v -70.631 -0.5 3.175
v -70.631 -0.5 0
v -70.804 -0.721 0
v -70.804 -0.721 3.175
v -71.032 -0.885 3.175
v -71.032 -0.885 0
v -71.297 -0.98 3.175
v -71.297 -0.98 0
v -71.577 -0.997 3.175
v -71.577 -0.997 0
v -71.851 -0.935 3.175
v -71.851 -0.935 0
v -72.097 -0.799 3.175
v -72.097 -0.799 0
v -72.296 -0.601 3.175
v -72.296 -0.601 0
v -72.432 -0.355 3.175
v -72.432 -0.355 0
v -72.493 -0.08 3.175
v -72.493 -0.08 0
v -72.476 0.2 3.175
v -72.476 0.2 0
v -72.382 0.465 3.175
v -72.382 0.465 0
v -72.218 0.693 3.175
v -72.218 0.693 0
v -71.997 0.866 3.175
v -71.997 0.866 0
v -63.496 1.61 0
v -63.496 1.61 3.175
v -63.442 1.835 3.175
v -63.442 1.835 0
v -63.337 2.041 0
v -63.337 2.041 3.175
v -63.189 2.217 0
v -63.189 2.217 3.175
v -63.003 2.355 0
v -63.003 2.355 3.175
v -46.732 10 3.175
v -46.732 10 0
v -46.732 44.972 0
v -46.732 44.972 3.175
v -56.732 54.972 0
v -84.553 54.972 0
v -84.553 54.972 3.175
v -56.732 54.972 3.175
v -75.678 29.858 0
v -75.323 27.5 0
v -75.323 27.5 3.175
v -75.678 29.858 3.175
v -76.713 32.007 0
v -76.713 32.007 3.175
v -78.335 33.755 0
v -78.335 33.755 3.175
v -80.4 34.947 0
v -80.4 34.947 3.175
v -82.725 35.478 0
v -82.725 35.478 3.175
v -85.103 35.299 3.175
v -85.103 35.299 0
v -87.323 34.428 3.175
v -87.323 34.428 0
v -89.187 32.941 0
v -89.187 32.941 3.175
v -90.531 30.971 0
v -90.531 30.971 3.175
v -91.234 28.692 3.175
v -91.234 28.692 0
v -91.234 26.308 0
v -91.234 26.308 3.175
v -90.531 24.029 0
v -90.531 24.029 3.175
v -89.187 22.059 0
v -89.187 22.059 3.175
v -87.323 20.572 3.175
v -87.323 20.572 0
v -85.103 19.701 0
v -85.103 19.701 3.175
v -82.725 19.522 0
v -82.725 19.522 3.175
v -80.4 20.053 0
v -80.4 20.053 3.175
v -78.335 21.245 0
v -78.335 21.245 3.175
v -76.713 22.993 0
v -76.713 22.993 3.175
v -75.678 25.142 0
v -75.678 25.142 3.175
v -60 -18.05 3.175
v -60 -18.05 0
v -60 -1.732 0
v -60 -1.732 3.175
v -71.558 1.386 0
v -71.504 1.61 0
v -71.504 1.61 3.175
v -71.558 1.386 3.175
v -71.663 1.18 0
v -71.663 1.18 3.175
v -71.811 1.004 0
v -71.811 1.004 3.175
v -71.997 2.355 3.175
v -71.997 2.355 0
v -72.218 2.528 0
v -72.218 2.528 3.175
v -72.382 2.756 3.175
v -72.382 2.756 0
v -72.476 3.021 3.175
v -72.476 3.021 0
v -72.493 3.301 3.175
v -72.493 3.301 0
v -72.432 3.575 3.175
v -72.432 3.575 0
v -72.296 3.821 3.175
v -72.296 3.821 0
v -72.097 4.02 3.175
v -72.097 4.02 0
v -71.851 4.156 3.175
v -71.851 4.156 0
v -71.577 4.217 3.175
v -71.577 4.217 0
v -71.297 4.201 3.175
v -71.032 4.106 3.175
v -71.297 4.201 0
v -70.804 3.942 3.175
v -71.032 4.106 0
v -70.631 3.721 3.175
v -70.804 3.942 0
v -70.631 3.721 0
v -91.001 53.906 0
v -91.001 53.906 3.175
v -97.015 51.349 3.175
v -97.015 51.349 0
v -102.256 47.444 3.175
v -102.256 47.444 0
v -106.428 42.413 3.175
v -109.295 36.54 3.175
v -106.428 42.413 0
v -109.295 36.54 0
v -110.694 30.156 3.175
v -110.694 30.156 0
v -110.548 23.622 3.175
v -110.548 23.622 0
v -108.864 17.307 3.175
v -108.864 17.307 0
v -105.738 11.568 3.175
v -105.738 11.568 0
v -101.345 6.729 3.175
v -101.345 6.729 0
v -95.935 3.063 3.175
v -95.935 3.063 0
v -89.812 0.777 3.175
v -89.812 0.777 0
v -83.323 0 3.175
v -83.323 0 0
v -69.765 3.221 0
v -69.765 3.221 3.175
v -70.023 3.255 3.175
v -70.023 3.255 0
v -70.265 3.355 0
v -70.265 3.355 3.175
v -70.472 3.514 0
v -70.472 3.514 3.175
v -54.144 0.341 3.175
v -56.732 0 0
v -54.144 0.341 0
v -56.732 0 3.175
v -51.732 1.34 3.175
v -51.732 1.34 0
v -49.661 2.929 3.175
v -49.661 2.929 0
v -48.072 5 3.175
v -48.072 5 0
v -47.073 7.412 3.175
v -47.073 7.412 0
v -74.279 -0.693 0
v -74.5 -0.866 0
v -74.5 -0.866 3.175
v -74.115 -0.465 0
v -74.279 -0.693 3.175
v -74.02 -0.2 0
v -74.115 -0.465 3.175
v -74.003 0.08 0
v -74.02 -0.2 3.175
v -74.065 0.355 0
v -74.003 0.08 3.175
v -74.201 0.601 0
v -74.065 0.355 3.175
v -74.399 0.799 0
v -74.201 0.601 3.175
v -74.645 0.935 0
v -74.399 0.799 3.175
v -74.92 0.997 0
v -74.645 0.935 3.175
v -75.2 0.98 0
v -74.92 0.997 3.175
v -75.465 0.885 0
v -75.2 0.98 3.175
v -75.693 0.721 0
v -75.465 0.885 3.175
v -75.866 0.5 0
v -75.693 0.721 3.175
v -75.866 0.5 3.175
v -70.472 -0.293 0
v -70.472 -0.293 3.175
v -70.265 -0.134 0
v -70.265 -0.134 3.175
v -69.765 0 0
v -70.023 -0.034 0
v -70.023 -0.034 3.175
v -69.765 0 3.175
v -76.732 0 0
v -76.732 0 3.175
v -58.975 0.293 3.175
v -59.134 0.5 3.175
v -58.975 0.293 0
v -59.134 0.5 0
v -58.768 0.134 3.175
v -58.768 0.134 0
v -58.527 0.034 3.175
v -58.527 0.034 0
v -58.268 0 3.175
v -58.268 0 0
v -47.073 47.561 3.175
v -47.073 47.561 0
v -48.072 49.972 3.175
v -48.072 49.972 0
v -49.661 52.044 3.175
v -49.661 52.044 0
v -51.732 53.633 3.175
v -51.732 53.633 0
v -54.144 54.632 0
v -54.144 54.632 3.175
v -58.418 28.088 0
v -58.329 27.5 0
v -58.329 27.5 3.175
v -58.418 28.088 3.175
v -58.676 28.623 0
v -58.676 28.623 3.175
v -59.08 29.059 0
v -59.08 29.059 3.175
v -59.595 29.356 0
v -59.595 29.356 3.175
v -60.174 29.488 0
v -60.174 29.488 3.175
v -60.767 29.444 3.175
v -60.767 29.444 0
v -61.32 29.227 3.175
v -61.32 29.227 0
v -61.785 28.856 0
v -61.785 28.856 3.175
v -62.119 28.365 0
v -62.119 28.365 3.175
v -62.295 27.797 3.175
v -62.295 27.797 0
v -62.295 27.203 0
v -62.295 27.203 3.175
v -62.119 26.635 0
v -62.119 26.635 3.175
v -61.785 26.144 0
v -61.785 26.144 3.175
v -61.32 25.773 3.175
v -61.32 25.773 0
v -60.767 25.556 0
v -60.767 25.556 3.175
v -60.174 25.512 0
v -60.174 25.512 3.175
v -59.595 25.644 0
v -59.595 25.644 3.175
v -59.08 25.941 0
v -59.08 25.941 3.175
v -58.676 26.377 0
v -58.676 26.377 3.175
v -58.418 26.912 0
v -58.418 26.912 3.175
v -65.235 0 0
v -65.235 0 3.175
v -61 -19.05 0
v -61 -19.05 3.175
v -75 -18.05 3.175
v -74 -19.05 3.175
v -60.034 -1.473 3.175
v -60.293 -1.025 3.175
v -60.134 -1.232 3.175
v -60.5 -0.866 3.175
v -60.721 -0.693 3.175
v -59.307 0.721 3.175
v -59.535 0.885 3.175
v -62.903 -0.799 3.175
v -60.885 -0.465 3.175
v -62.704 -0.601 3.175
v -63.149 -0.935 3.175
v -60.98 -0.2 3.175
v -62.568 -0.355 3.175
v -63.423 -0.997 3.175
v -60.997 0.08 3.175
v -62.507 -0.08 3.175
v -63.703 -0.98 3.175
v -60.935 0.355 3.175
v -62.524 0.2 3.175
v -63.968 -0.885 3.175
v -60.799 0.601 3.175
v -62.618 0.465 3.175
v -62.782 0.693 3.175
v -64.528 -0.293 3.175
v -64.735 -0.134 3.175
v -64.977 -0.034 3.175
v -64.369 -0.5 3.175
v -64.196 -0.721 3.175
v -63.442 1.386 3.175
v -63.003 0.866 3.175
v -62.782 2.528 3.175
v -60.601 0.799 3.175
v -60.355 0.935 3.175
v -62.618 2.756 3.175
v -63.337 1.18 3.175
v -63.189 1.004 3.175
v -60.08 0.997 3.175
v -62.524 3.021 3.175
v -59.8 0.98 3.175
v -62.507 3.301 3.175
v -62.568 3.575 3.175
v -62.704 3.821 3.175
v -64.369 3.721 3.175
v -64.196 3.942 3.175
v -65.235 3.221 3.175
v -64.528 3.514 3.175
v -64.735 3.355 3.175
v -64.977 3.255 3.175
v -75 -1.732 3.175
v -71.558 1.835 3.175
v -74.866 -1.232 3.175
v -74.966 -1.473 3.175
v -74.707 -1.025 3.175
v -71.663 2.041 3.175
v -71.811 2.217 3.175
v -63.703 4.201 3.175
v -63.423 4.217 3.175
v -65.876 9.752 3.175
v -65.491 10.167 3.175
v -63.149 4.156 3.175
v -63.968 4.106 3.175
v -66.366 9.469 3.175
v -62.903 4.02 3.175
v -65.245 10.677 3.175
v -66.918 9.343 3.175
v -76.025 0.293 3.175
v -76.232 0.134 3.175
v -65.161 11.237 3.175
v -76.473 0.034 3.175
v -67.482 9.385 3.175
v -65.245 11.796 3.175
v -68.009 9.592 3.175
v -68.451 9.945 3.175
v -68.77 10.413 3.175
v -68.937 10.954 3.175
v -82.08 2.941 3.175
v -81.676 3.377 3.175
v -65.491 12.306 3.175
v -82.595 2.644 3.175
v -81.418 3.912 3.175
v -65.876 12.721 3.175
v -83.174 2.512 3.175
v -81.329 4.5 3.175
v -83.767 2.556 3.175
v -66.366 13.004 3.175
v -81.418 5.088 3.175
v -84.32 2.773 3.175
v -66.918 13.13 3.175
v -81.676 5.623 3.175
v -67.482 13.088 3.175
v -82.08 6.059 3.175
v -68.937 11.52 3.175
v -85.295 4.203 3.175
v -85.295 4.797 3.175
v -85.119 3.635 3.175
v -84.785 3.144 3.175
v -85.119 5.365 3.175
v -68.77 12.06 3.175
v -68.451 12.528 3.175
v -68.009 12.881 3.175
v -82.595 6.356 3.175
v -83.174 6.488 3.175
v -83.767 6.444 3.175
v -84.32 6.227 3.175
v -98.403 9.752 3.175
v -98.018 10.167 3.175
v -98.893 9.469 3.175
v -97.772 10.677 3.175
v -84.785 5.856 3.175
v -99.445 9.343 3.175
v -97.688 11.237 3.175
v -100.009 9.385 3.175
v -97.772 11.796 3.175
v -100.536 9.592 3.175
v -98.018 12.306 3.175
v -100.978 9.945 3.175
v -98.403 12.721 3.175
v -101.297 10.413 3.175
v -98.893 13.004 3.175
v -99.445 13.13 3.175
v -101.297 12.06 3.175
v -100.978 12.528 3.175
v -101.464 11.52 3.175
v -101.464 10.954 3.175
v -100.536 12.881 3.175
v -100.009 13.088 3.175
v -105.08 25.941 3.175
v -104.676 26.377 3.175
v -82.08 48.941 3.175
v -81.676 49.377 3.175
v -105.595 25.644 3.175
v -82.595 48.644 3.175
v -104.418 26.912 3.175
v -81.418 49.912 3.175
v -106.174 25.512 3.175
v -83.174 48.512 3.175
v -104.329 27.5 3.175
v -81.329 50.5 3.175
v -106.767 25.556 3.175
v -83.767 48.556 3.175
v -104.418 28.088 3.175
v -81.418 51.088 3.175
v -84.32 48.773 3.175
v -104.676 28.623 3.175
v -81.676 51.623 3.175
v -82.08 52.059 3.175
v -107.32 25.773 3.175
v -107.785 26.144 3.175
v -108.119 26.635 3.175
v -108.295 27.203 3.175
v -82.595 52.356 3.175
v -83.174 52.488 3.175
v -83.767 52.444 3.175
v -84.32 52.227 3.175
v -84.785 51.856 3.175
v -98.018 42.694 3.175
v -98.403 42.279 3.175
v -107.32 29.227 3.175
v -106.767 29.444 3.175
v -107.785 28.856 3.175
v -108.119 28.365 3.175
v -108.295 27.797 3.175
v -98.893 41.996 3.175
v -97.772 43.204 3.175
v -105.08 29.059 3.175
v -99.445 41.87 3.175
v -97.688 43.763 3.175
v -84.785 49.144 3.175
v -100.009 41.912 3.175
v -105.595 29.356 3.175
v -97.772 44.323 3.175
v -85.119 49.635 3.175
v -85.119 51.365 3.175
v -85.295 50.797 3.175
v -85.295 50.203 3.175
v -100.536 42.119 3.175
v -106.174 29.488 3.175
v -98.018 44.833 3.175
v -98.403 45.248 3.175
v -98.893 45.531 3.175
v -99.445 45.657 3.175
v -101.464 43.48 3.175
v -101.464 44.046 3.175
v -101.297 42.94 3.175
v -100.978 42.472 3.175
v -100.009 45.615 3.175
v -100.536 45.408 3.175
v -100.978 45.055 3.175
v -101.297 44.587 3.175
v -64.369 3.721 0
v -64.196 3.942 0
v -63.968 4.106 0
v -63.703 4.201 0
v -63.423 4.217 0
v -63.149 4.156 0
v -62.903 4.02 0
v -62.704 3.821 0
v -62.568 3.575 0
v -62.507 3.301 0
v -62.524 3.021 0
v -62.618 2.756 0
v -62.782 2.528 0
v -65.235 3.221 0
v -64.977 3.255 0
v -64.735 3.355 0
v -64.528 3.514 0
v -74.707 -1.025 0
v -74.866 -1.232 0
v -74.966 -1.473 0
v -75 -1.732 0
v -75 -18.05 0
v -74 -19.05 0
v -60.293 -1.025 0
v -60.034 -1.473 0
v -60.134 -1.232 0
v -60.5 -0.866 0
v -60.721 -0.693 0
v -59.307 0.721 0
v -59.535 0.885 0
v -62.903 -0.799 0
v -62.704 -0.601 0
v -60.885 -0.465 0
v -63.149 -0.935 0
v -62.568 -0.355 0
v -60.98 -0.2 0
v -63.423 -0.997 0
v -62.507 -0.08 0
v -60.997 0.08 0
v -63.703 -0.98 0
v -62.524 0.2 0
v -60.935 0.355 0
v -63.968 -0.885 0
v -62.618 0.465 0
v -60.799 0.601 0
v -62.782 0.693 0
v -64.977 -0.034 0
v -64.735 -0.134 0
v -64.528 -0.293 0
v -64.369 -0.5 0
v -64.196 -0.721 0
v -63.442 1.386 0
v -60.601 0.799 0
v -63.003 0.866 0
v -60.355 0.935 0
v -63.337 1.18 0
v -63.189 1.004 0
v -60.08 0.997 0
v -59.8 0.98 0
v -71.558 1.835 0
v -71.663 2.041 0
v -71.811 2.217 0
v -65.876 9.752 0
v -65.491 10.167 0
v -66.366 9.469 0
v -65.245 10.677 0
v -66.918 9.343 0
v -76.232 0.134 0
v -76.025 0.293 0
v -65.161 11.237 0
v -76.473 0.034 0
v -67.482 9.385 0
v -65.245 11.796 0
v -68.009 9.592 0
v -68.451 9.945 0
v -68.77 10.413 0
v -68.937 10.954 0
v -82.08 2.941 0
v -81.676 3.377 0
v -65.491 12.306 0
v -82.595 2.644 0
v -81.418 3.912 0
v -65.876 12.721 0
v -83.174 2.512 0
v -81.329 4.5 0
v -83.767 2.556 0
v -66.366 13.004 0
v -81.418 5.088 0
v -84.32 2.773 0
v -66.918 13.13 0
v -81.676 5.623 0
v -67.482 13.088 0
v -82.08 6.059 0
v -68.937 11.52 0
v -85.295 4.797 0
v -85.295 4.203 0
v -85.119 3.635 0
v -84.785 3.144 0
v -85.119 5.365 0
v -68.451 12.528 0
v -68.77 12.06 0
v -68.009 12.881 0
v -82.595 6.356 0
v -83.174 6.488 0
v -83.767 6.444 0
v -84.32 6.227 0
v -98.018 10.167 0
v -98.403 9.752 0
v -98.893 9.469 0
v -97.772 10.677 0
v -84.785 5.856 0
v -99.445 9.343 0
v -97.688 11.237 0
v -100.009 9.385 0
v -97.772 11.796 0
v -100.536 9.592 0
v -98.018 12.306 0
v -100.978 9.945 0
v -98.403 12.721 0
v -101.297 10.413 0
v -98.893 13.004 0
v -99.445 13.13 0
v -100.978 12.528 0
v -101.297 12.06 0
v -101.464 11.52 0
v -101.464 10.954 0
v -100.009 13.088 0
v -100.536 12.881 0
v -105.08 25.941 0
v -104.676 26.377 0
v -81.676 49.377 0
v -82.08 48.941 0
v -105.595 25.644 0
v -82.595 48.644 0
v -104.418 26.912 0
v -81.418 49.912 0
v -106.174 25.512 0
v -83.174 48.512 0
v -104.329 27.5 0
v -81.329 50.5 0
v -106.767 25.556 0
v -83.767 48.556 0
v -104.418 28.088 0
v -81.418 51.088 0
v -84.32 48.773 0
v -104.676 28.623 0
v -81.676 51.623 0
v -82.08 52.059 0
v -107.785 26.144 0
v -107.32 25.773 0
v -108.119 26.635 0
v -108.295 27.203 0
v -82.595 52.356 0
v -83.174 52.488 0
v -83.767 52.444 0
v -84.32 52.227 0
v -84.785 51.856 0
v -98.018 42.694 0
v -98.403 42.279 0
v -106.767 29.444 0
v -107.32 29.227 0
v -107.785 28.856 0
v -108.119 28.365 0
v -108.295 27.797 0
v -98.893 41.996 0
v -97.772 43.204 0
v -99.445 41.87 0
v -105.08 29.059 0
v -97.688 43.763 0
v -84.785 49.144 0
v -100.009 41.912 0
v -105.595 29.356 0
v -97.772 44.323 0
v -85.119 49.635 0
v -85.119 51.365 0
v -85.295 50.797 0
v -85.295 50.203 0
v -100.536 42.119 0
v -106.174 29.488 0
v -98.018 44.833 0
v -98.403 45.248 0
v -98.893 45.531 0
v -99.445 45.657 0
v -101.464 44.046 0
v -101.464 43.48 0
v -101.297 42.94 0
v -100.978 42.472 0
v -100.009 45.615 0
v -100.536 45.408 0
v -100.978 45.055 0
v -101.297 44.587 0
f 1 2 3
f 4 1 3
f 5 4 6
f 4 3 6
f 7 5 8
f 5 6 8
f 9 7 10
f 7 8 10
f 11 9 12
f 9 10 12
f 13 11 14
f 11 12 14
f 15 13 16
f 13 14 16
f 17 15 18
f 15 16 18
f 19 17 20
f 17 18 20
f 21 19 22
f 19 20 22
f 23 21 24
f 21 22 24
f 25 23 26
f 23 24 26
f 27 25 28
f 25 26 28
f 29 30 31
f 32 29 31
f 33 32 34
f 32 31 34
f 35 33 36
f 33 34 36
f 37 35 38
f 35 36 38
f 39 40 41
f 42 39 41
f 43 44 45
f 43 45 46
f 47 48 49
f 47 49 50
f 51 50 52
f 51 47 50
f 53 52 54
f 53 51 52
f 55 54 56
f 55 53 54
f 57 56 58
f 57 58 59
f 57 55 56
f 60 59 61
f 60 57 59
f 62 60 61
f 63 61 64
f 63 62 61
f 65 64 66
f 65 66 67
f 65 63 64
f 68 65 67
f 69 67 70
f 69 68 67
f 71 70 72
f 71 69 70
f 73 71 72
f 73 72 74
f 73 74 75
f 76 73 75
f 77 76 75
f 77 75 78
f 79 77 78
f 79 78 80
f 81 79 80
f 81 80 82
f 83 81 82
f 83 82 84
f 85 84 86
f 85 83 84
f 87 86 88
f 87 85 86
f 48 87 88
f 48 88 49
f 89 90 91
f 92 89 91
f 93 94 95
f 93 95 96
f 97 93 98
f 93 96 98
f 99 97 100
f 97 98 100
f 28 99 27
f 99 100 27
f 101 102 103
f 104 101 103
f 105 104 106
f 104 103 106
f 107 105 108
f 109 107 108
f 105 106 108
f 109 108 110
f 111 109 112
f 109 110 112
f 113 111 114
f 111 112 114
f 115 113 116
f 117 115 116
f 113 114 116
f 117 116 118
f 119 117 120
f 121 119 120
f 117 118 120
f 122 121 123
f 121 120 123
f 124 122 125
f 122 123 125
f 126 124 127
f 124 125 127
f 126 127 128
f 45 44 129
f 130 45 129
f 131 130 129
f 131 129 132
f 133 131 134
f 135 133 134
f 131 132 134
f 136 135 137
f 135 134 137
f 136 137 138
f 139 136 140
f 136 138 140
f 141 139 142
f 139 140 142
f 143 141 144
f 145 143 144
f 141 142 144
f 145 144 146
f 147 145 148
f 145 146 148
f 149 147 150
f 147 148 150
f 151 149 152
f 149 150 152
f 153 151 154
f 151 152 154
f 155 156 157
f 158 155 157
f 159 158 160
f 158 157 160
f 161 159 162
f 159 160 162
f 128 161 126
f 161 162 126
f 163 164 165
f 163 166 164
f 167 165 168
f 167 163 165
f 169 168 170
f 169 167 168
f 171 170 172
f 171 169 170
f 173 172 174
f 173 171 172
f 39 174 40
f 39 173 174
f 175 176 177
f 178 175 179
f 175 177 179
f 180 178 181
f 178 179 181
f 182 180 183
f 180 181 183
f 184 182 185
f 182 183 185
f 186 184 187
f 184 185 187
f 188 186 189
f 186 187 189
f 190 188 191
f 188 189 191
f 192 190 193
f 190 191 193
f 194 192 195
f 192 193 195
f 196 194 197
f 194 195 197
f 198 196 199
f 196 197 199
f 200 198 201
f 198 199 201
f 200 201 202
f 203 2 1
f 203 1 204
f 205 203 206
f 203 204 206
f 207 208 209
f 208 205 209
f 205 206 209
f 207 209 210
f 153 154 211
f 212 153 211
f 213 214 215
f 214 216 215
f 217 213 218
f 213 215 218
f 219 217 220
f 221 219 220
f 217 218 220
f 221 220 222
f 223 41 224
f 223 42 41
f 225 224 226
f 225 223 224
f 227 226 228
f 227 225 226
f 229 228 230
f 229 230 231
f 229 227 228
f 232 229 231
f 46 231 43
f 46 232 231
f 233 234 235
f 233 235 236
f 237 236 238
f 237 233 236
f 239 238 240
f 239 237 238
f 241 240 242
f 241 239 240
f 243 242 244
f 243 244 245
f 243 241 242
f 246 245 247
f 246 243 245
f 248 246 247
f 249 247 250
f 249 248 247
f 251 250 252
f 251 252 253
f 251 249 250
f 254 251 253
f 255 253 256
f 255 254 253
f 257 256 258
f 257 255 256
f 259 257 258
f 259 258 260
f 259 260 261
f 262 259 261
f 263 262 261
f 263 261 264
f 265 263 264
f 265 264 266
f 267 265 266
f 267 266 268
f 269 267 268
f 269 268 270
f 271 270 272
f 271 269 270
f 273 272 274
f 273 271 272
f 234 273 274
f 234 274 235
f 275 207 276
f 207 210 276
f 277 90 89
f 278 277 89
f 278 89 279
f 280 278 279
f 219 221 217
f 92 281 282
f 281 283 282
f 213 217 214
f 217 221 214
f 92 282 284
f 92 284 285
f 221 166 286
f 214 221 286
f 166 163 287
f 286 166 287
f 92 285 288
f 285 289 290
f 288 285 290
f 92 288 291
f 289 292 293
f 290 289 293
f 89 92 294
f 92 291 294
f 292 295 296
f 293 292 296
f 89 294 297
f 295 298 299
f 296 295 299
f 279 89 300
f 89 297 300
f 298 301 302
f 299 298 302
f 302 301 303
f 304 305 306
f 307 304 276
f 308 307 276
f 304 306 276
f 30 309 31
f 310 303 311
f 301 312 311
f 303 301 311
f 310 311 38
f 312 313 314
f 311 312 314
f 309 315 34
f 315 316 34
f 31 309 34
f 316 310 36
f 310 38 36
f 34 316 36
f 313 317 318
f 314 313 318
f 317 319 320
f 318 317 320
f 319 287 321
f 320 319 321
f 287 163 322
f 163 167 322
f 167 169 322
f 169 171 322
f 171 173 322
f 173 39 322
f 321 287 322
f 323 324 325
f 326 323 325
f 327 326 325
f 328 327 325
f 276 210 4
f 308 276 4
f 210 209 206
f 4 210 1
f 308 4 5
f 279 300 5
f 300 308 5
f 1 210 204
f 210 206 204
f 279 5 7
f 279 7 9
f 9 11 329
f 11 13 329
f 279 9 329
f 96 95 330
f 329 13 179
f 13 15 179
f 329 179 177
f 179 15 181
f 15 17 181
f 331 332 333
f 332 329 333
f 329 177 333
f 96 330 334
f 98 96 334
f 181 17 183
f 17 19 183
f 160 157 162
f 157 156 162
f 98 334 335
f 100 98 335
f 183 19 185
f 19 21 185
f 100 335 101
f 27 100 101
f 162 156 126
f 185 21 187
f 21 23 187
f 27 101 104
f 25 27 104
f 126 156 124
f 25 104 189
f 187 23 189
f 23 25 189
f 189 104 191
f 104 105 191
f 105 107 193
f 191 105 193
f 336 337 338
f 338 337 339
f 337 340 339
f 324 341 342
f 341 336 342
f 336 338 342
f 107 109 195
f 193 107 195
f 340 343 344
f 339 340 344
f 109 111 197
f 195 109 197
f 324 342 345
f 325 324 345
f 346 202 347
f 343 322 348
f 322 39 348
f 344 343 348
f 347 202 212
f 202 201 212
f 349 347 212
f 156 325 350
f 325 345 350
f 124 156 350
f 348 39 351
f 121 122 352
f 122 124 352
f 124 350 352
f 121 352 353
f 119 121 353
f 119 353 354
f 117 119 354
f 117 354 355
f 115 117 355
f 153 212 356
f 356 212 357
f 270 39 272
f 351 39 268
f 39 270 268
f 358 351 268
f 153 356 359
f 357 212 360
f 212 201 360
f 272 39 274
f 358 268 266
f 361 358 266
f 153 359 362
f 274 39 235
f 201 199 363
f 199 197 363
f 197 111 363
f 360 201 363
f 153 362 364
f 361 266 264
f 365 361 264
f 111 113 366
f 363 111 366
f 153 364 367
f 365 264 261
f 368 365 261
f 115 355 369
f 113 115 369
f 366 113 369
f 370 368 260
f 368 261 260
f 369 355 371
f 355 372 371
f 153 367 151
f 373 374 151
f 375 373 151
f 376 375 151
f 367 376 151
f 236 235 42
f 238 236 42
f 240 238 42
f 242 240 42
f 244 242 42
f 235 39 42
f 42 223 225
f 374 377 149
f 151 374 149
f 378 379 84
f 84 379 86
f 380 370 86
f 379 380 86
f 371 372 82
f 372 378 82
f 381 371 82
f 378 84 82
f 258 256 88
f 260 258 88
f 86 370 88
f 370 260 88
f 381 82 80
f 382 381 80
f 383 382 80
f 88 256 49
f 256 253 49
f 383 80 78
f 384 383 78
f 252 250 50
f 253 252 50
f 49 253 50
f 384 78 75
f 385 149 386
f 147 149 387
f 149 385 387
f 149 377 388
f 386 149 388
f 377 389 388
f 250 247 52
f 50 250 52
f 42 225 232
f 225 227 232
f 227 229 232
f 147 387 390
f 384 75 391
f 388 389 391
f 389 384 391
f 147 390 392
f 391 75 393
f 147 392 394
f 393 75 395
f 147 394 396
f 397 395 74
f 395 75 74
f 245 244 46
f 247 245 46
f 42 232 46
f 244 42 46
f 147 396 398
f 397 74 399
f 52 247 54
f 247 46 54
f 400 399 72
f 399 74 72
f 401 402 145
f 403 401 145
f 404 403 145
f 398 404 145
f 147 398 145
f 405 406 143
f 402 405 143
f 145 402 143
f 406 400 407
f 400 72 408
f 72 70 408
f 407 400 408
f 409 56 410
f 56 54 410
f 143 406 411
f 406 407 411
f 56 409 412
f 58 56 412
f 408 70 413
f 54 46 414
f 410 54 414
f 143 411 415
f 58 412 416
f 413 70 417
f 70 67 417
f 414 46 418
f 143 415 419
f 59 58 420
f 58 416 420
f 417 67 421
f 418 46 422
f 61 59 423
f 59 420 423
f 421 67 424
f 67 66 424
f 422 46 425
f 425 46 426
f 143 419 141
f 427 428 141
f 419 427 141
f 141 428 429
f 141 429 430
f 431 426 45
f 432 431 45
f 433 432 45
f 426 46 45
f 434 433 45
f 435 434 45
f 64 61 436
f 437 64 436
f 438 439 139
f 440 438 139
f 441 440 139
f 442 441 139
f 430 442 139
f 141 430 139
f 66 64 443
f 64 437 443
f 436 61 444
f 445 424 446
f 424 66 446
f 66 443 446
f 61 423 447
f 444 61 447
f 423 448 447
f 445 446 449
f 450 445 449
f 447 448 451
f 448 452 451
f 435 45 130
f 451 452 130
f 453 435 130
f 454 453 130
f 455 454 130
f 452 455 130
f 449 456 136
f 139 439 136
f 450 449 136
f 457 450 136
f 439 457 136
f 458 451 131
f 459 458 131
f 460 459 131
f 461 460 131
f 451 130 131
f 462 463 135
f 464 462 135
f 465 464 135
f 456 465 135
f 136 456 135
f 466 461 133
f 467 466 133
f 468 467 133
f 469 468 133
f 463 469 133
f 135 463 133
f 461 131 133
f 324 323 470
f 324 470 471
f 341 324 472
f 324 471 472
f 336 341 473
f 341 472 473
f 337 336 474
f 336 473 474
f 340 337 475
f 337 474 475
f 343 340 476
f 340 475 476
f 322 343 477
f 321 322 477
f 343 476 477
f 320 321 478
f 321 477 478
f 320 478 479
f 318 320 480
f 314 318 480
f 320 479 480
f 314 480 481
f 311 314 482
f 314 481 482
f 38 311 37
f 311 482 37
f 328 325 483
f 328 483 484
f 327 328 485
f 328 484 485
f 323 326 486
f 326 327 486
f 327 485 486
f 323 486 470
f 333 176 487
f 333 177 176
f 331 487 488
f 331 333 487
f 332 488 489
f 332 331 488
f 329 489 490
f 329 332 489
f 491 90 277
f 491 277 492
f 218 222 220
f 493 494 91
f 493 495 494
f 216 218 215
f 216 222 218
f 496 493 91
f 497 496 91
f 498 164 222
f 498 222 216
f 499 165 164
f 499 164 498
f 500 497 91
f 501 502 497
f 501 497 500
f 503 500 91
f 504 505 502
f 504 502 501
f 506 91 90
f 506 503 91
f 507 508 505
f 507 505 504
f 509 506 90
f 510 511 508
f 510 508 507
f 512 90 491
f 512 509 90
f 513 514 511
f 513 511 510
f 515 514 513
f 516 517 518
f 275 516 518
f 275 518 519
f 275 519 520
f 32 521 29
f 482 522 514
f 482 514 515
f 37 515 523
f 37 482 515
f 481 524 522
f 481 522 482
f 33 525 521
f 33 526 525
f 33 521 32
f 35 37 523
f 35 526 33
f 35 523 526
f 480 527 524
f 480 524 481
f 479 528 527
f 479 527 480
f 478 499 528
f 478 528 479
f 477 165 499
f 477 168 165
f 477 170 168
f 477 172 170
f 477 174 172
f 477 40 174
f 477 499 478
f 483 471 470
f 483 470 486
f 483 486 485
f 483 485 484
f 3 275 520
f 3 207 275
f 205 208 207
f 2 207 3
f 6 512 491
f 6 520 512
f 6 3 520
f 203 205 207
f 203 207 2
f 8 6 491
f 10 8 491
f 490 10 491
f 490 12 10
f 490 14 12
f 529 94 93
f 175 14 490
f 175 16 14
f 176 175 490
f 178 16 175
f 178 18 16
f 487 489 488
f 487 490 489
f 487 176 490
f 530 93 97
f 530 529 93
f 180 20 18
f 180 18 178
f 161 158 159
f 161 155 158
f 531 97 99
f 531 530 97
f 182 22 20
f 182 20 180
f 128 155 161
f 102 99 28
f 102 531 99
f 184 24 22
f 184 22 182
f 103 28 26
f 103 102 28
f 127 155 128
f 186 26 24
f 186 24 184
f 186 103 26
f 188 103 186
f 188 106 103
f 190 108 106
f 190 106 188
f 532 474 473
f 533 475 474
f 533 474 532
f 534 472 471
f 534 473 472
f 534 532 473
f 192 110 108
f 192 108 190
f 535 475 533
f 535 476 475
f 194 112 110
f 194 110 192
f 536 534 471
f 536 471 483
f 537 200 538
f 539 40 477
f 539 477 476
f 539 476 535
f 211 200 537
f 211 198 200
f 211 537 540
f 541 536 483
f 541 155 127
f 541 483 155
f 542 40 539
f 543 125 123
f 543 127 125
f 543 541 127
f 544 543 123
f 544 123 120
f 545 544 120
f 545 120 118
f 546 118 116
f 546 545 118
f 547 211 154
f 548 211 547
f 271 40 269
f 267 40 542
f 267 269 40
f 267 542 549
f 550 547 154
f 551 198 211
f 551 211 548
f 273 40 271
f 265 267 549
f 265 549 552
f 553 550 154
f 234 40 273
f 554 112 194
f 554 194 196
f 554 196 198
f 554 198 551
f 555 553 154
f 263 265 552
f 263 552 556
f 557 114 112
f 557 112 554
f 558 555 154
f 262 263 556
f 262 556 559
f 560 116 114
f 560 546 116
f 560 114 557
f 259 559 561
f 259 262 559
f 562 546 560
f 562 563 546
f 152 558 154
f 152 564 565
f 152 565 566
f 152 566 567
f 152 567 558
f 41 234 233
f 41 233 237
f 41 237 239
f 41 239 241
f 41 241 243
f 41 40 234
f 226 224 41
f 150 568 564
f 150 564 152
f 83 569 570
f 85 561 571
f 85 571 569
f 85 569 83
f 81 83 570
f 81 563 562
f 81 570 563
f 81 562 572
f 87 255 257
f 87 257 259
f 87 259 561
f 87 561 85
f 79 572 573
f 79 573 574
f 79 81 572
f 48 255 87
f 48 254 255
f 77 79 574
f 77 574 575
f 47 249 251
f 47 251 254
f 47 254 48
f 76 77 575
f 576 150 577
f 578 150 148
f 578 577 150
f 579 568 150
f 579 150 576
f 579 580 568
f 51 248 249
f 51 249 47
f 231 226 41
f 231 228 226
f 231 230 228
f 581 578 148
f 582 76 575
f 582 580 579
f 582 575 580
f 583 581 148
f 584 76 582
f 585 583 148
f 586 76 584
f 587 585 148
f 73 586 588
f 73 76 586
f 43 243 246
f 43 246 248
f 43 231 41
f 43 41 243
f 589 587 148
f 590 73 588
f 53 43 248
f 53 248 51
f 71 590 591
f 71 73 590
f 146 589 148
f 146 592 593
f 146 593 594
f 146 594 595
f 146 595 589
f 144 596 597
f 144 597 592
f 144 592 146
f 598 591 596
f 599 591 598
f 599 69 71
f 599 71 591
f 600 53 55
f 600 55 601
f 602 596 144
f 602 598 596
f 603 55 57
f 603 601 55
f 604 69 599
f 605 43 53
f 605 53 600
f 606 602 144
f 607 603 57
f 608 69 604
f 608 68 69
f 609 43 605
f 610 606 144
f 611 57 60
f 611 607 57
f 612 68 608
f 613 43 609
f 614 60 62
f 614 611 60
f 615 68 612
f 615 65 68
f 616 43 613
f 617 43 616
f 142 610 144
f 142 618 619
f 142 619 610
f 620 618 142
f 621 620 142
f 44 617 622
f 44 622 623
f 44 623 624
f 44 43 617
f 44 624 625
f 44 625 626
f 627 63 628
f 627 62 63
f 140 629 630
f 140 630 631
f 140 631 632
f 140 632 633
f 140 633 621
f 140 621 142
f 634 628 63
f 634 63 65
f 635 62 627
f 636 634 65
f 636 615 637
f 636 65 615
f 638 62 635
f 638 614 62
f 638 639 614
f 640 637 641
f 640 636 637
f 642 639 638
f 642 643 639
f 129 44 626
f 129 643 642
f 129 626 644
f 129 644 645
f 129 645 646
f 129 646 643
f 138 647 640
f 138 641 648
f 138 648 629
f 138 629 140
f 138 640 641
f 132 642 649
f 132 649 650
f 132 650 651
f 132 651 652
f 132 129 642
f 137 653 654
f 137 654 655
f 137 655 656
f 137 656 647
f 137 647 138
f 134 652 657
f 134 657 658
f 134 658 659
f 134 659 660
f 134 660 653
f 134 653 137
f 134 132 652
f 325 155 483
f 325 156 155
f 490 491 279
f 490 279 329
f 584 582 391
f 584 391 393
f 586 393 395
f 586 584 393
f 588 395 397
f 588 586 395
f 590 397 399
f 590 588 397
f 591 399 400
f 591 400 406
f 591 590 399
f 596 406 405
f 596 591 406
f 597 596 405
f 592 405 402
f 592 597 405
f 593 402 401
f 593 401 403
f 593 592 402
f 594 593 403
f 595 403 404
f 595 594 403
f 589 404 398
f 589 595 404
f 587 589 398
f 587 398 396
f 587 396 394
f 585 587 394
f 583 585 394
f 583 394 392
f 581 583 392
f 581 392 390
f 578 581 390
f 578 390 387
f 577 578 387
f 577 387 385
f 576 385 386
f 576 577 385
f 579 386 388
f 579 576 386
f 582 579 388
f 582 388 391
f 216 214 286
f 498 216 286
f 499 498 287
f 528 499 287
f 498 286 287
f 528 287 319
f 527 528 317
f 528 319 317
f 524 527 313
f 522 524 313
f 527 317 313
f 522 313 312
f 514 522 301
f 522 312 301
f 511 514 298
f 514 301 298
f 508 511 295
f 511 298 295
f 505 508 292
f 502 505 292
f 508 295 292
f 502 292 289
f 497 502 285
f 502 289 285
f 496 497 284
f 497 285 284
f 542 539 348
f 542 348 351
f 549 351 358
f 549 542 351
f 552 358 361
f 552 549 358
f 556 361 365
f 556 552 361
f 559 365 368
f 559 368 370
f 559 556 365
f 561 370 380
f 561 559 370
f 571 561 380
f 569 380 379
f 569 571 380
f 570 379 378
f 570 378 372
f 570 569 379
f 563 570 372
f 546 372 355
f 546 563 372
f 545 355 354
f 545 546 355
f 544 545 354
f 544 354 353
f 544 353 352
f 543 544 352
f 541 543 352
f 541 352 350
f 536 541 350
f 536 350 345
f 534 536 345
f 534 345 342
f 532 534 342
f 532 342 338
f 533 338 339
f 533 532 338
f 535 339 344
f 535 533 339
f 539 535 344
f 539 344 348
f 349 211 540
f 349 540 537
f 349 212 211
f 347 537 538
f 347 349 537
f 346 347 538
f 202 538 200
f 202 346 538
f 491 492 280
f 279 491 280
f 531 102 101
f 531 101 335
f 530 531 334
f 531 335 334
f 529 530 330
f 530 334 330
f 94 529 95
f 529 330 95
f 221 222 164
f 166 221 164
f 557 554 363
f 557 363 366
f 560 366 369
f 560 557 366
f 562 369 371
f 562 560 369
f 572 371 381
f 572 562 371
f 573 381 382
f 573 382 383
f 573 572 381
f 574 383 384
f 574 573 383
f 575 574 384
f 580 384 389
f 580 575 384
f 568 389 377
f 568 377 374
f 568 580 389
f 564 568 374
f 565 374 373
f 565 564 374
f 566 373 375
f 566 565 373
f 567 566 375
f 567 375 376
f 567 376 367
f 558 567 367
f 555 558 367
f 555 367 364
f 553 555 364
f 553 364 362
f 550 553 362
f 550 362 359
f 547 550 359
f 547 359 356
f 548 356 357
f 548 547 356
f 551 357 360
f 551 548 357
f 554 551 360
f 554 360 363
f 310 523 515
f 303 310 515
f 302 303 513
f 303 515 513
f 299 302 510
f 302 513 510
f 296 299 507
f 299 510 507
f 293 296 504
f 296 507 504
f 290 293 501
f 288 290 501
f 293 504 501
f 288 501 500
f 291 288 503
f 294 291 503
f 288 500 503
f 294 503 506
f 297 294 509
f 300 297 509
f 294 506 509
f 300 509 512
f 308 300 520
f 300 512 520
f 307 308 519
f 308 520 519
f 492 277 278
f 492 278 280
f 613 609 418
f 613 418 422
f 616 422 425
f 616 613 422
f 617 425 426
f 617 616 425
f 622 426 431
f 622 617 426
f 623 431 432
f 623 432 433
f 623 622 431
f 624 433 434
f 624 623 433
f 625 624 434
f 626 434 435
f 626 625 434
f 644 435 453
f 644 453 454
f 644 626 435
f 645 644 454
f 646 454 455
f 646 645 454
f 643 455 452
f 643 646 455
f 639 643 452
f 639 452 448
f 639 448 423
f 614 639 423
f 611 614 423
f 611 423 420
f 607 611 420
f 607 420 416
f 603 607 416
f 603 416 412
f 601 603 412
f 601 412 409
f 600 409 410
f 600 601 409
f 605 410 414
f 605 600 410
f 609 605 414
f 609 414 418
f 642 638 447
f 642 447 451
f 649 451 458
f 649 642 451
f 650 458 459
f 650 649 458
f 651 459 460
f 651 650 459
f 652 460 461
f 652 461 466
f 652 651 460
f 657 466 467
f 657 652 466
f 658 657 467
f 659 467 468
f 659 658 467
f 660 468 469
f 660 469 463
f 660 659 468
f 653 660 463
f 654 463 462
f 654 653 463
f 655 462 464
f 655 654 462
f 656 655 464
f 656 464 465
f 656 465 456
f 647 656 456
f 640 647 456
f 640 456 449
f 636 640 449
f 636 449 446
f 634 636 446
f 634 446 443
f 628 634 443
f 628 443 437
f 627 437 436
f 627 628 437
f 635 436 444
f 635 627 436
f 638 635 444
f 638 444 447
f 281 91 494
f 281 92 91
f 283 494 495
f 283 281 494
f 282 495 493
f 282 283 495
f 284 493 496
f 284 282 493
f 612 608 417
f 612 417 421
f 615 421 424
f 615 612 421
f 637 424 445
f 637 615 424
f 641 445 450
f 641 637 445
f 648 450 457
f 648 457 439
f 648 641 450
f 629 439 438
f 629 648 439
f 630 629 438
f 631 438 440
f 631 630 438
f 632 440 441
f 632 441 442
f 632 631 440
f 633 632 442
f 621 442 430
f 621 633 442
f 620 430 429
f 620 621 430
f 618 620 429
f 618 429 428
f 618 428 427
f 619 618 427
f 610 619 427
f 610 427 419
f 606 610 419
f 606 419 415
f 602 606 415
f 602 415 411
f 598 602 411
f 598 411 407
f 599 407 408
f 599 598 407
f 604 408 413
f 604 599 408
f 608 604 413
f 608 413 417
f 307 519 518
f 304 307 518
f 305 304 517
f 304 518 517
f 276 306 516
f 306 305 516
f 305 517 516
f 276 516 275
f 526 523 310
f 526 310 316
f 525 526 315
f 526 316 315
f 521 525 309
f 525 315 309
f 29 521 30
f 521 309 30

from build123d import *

# Parameters (mm, degrees)
SKETCH1_R           = 8
SKETCH1_R_2         = 1.89865
SKETCH1_R_3         = 1.9939
BOSS_EXTRUDE1_DEPTH = 3.175
FILLET1_R           = 10
SKETCH2_W           = 15
SKETCH2_H           = 19.05
BOSS_EXTRUDE2_DEPTH = 3.175
SKETCH3_R           = 1
CUT_EXTRUDE1_DEPTH  = 158.949594679
CHAMFER1_SIZE       = 1
FILLET2_R           = 1
SKETCH4_W           = 7.99338
SKETCH4_H           = 3.22072
CUT_EXTRUDE2_DEPTH  = 158.949594679
CUT_EXTRUDE3_DEPTH  = 158.949594679
FILLET3_R           = 10
SKETCH6_R           = 1
CUT_EXTRUDE4_DEPTH  = 124.748935267
FILLET4_R           = 1


with BuildPart() as part:
    # Sketch1 → Boss-Extrude1 (new body)
    with BuildSketch(Plane.XY):
        with BuildLine():
            Line((-40.498784978, 0), (0, 0))
            Line((0, 0), (0, 75))
            ThreePointArc((0, 75), (-37.5, 112.5), (-75, 75))
            Line((-75, 75), (-75, 55))
            Line((-75, 55), (-83.323029145, 55))
            ThreePointArc((-83.323029145, 55), (-110.823029145, 27.5), (-83.323029145, 0))
            Line((-83.323029145, 0), (-40.498784978, 0))
        make_face()
        with Locations((-83.323029145, 27.5)):
            Circle(SKETCH1_R, mode=Mode.SUBTRACT)
        with Locations((-67.059573177, 11.236544033)):
            Circle(SKETCH1_R_2, mode=Mode.SUBTRACT)
        with Locations((-83.323029145, 50.5)):
            Circle(SKETCH1_R_3, mode=Mode.SUBTRACT)
        with Locations((-99.586485112, 11.236544033)):
            Circle(SKETCH1_R_2, mode=Mode.SUBTRACT)
        with Locations((-60.323029145, 27.5)):
            Circle(SKETCH1_R_3, mode=Mode.SUBTRACT)
        with Locations((-99.586485112, 43.763455967)):
            Circle(SKETCH1_R_2, mode=Mode.SUBTRACT)
        with Locations((-83.323029145, 4.5)):
            Circle(SKETCH1_R_3, mode=Mode.SUBTRACT)
        with Locations((-106.323029145, 27.5)):
            Circle(SKETCH1_R_3, mode=Mode.SUBTRACT)
    extrude(amount=BOSS_EXTRUDE1_DEPTH)

    # Fillet1
    fillet1_edges = [part.edges().sort_by_distance(p)[0] for p in [
        (-75, 55, 1.5875),
    ]]
    fillet(fillet1_edges, radius=FILLET1_R)

    # Sketch2 → Boss-Extrude2 (add)
    with BuildSketch(Plane(origin=(0, 0, 0), x_dir=(-1, 0, 0), z_dir=(0, 0, -1))):
        with Locations((7.5, -9.525)):
            Rectangle(SKETCH2_W, SKETCH2_H)
        with Locations((37.5, -9.525)):
            Rectangle(SKETCH2_W, SKETCH2_H)
        with Locations((67.5, -9.525)):
            Rectangle(SKETCH2_W, SKETCH2_H)
    extrude(amount=-BOSS_EXTRUDE2_DEPTH)

    # Sketch3 → Cut-Extrude1 (cut, through all)
    with BuildSketch(Plane.XY.offset(3.175)):
        with Locations((-75, 0)):
            Circle(SKETCH3_R)
        with Locations((-60, 0)):
            Circle(SKETCH3_R)
        with Locations((-45, 0)):
            Circle(SKETCH3_R)
        with Locations((-30, 0)):
            Circle(SKETCH3_R)
        with Locations((-15, 0)):
            Circle(SKETCH3_R)
    extrude(amount=-CUT_EXTRUDE1_DEPTH, mode=Mode.SUBTRACT)

    # Chamfer1
    chamfer1_edges = [part.edges().sort_by_distance(p)[0] for p in [
        (0, -19.05, 1.5875),
        (-15, -19.05, 1.5875),
        (-30, -19.05, 1.5875),
        (-45, -19.05, 1.5875),
        (-60, -19.05, 1.5875),
        (-75, -19.05, 1.5875),
    ]]
    chamfer(chamfer1_edges, length=CHAMFER1_SIZE)

    # Fillet2
    fillet2_edges = [part.edges().sort_by_distance(p)[0] for p in [
        (-75, -1, 1.5875),
        (-76, 0, 1.5875),
        (-60, -1, 1.5875),
        (-59, 0, 1.5875),
        (-45, -1, 1.5875),
        (-46, 0, 1.5875),
        (-30, -1, 1.5875),
        (-29, 0, 1.5875),
        (-15, -1, 1.5875),
        (-16, 0, 1.5875),
    ]]
    fillet(fillet2_edges, radius=FILLET2_R)

    # Sketch4 → Cut-Extrude2 (cut, through all)
    with BuildSketch(Plane.XY.offset(3.175)):
        with Locations((-67.5, 1.61036)):
            Rectangle(SKETCH4_W, SKETCH4_H)
    extrude(amount=-CUT_EXTRUDE2_DEPTH, mode=Mode.SUBTRACT)

    # Sketch5 → Cut-Extrude3 (cut, through all)
    with BuildSketch(Plane(origin=(0, 0, 0), x_dir=(-1, 0, 0), z_dir=(0, 0, -1))):
        Polygon((84.552807772, 54.972488867), (46.732050808, 54.972488867), (46.732050808, 0), (46.732050808, -19.05), (0, -19.05), (0, 112.5), (84.552807772, 112.5), align=None)
    extrude(amount=-CUT_EXTRUDE3_DEPTH, mode=Mode.SUBTRACT)

    # Fillet3
    fillet3_edges = [part.edges().sort_by_distance(p)[0] for p in [
        (-46.732050808, 0, 1.5875),
        (-46.732050808, 54.972488867, 1.5875),
    ]]
    fillet(fillet3_edges, radius=FILLET3_R)

    # Sketch6 → Cut-Extrude4 (cut, through all)
    with BuildSketch(Plane(origin=(0, 0, 0), x_dir=(-1, 0, 0), z_dir=(0, 0, -1))):
        with Locations((63.50331, 3.22072)):
            Circle(SKETCH6_R)
        with Locations((71.49669, 3.22072)):
            Circle(SKETCH6_R)
        with Locations((71.49669, 0)):
            Circle(SKETCH6_R)
        with Locations((63.50331, 0)):
            Circle(SKETCH6_R)
    extrude(amount=-CUT_EXTRUDE4_DEPTH, mode=Mode.SUBTRACT)

    # Fillet4
    # the kernel refuses this fillet: 1 mm, written as the material it takes off along each edge
    with BuildSketch(Plane(origin=(-70.49669, 3.22072, 5.005127019), x_dir=(1, 0, 0), z_dir=(0, 0, -1)), Plane(origin=(-71.49669, 1, 5.005127019), x_dir=(0, 1, 0), z_dir=(0, 0, -1)), Plane(origin=(-63.50331, 2.22072, 5.005127019), x_dir=(0, -1, 0), z_dir=(0, 0, -1))) as fillet4_piece_1:
        with BuildLine():
            CenterArc((0.732050808, -1), FILLET4_R, 90, 60)
            ThreePointArc((-0.133974596, -0.5), (-0.034074174, -0.258819045), (0, 0))
            Line((0, 0), (0.732050808, 0))
        make_face()
    extrude(amount=6.835254038, mode=Mode.SUBTRACT)
    with BuildSketch(Plane(origin=(-71.49669, 2.22072, 5.005127019), x_dir=(-0.9659258262890673, 0.25881904510252446, 0), z_dir=(0, 0, -1)), Plane(origin=(-70.49669, 0, 5.005127019), x_dir=(-0.25881904510253056, -0.9659258262890658, 0), z_dir=(0, 0, -1))) as fillet4_piece_2:
        with BuildLine():
            CenterArc((0.776457135, -0.965925826), FILLET4_R, 105, 60)
            Line((-0.189468691, -0.707106781), (0, 0))
            ThreePointArc((0, 0), (0.258819045, -0.034074174), (0.51763809, 0))
        make_face()
    extrude(amount=6.835254038, mode=Mode.SUBTRACT)
    with BuildSketch(Plane(origin=(-64.50331, 0, -1.830127019), x_dir=(-1, 0, 0), z_dir=(0, 0, 1)), Plane(origin=(-63.50331, 1, 5.005127019), x_dir=(0, 1, 0), z_dir=(0, 0, -1))) as fillet4_piece_3:
        with BuildLine():
            CenterArc((0.732050808, 1), FILLET4_R, 210, 60)
            ThreePointArc((-0.133974596, 0.5), (-0.034074174, 0.258819045), (0, 0))
            Line((0, 0), (0.732050808, 0))
        make_face()
    extrude(amount=6.835254038, mode=Mode.SUBTRACT)
    with BuildSketch(Plane(origin=(-64.50331, 3.22072, -1.830127019), x_dir=(0.25881904510250514, 0.9659258262890725, 0), z_dir=(0, 0, 1))) as fillet4_piece_4:
        with BuildLine():
            CenterArc((0.776457135, 0.965925826), FILLET4_R, 195, 60)
            Line((-0.189468691, 0.707106781), (0, 0))
            ThreePointArc((0, 0), (0.258819045, 0.034074174), (0.51763809, 0))
        make_face()
    extrude(amount=6.835254038, mode=Mode.SUBTRACT)


solid = part.part
